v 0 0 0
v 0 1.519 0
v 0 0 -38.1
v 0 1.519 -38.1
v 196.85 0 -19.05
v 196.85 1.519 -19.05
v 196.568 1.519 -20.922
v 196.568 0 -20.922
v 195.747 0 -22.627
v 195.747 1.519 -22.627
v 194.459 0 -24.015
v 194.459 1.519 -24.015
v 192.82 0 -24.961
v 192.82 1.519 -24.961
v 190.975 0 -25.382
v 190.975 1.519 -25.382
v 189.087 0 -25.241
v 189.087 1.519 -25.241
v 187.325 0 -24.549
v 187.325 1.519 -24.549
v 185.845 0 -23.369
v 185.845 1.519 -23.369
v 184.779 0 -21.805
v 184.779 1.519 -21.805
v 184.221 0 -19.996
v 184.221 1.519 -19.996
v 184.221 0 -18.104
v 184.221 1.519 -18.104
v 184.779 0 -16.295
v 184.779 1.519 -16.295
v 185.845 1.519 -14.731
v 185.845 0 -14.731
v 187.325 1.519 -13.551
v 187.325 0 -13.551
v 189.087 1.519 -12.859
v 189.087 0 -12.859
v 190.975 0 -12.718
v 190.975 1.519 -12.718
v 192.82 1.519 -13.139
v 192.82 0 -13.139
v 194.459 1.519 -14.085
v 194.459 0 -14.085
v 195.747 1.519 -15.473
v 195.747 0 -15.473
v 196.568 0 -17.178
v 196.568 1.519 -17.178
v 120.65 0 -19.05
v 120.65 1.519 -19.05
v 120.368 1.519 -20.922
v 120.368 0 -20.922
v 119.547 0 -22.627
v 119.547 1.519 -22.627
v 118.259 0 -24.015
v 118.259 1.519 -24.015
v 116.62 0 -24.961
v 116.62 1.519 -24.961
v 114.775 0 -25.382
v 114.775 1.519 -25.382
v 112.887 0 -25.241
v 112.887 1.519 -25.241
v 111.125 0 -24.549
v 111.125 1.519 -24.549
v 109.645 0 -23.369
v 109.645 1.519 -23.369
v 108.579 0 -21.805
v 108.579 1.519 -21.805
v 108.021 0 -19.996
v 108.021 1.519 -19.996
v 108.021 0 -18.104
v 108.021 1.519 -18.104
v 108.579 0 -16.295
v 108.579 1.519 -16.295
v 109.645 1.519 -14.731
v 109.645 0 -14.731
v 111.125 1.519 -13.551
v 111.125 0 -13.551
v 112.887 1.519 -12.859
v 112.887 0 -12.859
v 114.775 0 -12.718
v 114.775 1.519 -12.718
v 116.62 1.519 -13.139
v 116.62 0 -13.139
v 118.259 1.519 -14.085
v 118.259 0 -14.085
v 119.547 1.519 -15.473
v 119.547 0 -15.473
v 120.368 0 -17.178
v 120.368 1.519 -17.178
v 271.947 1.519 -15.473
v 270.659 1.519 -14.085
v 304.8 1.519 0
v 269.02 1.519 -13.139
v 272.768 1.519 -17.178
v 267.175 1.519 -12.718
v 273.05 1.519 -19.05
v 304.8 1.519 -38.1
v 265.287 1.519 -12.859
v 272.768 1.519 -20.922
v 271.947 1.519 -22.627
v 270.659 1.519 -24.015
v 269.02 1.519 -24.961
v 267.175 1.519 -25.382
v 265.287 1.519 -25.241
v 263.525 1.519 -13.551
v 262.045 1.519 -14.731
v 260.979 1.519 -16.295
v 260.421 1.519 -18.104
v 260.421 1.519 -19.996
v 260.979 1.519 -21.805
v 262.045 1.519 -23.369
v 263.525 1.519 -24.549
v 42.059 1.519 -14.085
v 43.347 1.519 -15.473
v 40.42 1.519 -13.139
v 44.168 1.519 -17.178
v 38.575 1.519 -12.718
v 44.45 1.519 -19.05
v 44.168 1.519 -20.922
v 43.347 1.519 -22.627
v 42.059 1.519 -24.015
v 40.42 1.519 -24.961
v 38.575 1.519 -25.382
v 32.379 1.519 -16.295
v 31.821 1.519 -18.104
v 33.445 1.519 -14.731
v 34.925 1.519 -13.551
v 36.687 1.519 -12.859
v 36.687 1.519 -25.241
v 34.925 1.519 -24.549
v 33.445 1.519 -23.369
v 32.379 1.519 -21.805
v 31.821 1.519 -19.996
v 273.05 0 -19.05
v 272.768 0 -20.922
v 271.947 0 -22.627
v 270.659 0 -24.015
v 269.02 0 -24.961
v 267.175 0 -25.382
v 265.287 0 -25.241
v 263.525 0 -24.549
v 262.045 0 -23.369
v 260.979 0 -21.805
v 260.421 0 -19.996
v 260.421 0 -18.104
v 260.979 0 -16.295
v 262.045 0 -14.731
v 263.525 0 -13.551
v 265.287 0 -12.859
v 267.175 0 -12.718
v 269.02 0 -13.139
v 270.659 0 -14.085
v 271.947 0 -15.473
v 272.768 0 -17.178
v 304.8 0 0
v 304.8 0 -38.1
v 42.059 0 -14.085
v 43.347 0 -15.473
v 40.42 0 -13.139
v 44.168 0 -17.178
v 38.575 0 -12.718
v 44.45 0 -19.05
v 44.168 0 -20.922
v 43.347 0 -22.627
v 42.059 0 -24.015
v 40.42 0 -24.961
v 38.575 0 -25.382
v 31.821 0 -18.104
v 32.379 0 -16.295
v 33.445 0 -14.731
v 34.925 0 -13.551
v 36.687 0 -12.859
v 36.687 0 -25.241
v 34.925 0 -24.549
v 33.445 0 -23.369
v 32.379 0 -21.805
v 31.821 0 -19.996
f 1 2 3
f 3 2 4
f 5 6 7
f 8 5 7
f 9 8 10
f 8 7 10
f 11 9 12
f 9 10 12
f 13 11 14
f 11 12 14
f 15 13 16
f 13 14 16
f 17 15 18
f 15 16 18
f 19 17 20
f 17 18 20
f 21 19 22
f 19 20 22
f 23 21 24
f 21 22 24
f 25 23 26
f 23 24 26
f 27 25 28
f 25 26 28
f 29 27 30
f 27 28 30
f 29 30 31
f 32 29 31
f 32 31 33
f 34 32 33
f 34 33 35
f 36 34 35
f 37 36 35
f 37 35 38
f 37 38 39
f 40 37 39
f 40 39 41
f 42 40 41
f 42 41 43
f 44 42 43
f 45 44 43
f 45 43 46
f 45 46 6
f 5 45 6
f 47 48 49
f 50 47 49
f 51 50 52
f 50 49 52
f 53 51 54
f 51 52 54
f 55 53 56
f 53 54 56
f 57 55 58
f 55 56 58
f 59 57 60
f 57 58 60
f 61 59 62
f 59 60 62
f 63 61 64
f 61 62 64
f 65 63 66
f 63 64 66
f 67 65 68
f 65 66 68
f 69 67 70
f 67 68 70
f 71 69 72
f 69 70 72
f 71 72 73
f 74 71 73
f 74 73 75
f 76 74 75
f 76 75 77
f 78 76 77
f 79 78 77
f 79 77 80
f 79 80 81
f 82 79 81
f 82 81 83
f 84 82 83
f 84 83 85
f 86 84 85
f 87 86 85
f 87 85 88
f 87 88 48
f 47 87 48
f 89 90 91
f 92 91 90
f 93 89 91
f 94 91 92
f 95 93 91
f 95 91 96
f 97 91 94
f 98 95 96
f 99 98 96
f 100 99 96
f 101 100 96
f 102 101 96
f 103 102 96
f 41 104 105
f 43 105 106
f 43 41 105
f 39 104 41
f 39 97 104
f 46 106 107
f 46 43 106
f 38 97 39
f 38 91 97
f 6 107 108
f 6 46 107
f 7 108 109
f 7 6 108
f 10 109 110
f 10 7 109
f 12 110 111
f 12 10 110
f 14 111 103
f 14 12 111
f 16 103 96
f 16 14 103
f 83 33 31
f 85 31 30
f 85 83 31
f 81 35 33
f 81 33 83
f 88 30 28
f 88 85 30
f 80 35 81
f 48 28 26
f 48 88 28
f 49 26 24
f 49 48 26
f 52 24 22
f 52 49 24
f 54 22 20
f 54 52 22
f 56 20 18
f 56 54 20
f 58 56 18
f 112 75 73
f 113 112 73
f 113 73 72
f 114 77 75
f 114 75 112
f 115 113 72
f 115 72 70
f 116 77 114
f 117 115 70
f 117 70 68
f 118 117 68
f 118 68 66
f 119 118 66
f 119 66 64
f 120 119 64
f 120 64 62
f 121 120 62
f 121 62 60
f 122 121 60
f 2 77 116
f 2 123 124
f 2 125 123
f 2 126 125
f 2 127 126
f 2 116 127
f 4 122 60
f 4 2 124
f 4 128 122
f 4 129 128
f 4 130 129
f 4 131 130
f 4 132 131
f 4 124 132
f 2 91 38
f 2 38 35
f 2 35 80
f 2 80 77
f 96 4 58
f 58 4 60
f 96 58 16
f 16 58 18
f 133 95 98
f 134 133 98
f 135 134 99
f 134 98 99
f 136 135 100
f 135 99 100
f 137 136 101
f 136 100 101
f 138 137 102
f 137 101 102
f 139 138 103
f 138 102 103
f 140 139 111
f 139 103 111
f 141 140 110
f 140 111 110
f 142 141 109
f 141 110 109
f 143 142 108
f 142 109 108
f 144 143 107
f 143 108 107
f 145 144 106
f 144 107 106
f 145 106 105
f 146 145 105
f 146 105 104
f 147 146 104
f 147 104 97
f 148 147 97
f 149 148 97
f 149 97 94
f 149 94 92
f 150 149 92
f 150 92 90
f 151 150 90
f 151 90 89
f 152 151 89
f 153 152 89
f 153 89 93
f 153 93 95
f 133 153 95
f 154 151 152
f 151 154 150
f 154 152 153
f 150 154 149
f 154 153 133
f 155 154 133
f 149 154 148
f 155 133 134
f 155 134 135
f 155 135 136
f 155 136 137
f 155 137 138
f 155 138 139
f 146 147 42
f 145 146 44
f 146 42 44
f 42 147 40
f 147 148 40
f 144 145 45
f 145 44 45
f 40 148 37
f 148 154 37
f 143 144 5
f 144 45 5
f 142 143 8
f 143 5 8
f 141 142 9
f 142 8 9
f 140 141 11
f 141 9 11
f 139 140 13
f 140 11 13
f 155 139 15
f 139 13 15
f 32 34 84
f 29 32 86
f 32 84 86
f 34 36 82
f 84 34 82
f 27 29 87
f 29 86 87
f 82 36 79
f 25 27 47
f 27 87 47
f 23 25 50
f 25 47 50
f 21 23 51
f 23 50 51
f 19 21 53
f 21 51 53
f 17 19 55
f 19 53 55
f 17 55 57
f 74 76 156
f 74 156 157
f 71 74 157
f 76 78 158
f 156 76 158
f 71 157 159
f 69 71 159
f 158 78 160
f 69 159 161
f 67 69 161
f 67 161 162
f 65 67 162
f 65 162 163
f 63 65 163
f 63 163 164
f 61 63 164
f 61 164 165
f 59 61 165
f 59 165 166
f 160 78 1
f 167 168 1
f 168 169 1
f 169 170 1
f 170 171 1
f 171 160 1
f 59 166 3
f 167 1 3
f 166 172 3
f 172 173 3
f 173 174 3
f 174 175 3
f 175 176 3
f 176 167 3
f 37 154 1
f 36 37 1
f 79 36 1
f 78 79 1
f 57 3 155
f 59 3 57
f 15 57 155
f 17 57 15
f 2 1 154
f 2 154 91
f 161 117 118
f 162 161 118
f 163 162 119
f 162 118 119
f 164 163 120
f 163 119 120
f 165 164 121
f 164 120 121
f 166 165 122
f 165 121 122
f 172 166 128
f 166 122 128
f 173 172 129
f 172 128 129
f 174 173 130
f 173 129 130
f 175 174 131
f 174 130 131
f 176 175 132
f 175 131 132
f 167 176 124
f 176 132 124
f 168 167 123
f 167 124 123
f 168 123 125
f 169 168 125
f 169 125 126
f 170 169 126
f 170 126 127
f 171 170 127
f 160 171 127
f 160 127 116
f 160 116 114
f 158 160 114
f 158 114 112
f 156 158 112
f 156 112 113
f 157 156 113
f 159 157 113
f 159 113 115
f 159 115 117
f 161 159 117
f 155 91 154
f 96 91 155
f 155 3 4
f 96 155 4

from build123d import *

# Parameters (mm, degrees)
SKETCH1_W           = 38.1
SKETCH1_H           = 1.51892
BOSS_EXTRUDE1_DEPTH = 304.8
SKETCH3_R           = 6.35
CUT_EXTRUDE1_DEPTH  = 2.51892


with BuildPart() as part:
    # Sketch1 → Boss-Extrude1 (new body)
    with BuildSketch(Plane(origin=(0, 0, 0), x_dir=(0, 0, -1), z_dir=(1, 0, 0))):
        with Locations((19.05, 0.75946)):
            Rectangle(SKETCH1_W, SKETCH1_H)
    extrude(amount=BOSS_EXTRUDE1_DEPTH)

    # Sketch3 → Cut-Extrude1 (cut, through all)
    with BuildSketch(Plane(origin=(0, 1.51892, 0), x_dir=(1, 0, 0), z_dir=(0, 1, 0))):
        with Locations((114.3, 19.05)):
            Circle(SKETCH3_R)
        with Locations((190.5, 19.05)):
            Circle(SKETCH3_R)
        with Locations((266.7, 19.05)):
            Circle(SKETCH3_R)
        with Locations((38.1, 19.05)):
            Circle(SKETCH3_R)
    extrude(amount=-CUT_EXTRUDE1_DEPTH, mode=Mode.SUBTRACT)


solid = part.part
